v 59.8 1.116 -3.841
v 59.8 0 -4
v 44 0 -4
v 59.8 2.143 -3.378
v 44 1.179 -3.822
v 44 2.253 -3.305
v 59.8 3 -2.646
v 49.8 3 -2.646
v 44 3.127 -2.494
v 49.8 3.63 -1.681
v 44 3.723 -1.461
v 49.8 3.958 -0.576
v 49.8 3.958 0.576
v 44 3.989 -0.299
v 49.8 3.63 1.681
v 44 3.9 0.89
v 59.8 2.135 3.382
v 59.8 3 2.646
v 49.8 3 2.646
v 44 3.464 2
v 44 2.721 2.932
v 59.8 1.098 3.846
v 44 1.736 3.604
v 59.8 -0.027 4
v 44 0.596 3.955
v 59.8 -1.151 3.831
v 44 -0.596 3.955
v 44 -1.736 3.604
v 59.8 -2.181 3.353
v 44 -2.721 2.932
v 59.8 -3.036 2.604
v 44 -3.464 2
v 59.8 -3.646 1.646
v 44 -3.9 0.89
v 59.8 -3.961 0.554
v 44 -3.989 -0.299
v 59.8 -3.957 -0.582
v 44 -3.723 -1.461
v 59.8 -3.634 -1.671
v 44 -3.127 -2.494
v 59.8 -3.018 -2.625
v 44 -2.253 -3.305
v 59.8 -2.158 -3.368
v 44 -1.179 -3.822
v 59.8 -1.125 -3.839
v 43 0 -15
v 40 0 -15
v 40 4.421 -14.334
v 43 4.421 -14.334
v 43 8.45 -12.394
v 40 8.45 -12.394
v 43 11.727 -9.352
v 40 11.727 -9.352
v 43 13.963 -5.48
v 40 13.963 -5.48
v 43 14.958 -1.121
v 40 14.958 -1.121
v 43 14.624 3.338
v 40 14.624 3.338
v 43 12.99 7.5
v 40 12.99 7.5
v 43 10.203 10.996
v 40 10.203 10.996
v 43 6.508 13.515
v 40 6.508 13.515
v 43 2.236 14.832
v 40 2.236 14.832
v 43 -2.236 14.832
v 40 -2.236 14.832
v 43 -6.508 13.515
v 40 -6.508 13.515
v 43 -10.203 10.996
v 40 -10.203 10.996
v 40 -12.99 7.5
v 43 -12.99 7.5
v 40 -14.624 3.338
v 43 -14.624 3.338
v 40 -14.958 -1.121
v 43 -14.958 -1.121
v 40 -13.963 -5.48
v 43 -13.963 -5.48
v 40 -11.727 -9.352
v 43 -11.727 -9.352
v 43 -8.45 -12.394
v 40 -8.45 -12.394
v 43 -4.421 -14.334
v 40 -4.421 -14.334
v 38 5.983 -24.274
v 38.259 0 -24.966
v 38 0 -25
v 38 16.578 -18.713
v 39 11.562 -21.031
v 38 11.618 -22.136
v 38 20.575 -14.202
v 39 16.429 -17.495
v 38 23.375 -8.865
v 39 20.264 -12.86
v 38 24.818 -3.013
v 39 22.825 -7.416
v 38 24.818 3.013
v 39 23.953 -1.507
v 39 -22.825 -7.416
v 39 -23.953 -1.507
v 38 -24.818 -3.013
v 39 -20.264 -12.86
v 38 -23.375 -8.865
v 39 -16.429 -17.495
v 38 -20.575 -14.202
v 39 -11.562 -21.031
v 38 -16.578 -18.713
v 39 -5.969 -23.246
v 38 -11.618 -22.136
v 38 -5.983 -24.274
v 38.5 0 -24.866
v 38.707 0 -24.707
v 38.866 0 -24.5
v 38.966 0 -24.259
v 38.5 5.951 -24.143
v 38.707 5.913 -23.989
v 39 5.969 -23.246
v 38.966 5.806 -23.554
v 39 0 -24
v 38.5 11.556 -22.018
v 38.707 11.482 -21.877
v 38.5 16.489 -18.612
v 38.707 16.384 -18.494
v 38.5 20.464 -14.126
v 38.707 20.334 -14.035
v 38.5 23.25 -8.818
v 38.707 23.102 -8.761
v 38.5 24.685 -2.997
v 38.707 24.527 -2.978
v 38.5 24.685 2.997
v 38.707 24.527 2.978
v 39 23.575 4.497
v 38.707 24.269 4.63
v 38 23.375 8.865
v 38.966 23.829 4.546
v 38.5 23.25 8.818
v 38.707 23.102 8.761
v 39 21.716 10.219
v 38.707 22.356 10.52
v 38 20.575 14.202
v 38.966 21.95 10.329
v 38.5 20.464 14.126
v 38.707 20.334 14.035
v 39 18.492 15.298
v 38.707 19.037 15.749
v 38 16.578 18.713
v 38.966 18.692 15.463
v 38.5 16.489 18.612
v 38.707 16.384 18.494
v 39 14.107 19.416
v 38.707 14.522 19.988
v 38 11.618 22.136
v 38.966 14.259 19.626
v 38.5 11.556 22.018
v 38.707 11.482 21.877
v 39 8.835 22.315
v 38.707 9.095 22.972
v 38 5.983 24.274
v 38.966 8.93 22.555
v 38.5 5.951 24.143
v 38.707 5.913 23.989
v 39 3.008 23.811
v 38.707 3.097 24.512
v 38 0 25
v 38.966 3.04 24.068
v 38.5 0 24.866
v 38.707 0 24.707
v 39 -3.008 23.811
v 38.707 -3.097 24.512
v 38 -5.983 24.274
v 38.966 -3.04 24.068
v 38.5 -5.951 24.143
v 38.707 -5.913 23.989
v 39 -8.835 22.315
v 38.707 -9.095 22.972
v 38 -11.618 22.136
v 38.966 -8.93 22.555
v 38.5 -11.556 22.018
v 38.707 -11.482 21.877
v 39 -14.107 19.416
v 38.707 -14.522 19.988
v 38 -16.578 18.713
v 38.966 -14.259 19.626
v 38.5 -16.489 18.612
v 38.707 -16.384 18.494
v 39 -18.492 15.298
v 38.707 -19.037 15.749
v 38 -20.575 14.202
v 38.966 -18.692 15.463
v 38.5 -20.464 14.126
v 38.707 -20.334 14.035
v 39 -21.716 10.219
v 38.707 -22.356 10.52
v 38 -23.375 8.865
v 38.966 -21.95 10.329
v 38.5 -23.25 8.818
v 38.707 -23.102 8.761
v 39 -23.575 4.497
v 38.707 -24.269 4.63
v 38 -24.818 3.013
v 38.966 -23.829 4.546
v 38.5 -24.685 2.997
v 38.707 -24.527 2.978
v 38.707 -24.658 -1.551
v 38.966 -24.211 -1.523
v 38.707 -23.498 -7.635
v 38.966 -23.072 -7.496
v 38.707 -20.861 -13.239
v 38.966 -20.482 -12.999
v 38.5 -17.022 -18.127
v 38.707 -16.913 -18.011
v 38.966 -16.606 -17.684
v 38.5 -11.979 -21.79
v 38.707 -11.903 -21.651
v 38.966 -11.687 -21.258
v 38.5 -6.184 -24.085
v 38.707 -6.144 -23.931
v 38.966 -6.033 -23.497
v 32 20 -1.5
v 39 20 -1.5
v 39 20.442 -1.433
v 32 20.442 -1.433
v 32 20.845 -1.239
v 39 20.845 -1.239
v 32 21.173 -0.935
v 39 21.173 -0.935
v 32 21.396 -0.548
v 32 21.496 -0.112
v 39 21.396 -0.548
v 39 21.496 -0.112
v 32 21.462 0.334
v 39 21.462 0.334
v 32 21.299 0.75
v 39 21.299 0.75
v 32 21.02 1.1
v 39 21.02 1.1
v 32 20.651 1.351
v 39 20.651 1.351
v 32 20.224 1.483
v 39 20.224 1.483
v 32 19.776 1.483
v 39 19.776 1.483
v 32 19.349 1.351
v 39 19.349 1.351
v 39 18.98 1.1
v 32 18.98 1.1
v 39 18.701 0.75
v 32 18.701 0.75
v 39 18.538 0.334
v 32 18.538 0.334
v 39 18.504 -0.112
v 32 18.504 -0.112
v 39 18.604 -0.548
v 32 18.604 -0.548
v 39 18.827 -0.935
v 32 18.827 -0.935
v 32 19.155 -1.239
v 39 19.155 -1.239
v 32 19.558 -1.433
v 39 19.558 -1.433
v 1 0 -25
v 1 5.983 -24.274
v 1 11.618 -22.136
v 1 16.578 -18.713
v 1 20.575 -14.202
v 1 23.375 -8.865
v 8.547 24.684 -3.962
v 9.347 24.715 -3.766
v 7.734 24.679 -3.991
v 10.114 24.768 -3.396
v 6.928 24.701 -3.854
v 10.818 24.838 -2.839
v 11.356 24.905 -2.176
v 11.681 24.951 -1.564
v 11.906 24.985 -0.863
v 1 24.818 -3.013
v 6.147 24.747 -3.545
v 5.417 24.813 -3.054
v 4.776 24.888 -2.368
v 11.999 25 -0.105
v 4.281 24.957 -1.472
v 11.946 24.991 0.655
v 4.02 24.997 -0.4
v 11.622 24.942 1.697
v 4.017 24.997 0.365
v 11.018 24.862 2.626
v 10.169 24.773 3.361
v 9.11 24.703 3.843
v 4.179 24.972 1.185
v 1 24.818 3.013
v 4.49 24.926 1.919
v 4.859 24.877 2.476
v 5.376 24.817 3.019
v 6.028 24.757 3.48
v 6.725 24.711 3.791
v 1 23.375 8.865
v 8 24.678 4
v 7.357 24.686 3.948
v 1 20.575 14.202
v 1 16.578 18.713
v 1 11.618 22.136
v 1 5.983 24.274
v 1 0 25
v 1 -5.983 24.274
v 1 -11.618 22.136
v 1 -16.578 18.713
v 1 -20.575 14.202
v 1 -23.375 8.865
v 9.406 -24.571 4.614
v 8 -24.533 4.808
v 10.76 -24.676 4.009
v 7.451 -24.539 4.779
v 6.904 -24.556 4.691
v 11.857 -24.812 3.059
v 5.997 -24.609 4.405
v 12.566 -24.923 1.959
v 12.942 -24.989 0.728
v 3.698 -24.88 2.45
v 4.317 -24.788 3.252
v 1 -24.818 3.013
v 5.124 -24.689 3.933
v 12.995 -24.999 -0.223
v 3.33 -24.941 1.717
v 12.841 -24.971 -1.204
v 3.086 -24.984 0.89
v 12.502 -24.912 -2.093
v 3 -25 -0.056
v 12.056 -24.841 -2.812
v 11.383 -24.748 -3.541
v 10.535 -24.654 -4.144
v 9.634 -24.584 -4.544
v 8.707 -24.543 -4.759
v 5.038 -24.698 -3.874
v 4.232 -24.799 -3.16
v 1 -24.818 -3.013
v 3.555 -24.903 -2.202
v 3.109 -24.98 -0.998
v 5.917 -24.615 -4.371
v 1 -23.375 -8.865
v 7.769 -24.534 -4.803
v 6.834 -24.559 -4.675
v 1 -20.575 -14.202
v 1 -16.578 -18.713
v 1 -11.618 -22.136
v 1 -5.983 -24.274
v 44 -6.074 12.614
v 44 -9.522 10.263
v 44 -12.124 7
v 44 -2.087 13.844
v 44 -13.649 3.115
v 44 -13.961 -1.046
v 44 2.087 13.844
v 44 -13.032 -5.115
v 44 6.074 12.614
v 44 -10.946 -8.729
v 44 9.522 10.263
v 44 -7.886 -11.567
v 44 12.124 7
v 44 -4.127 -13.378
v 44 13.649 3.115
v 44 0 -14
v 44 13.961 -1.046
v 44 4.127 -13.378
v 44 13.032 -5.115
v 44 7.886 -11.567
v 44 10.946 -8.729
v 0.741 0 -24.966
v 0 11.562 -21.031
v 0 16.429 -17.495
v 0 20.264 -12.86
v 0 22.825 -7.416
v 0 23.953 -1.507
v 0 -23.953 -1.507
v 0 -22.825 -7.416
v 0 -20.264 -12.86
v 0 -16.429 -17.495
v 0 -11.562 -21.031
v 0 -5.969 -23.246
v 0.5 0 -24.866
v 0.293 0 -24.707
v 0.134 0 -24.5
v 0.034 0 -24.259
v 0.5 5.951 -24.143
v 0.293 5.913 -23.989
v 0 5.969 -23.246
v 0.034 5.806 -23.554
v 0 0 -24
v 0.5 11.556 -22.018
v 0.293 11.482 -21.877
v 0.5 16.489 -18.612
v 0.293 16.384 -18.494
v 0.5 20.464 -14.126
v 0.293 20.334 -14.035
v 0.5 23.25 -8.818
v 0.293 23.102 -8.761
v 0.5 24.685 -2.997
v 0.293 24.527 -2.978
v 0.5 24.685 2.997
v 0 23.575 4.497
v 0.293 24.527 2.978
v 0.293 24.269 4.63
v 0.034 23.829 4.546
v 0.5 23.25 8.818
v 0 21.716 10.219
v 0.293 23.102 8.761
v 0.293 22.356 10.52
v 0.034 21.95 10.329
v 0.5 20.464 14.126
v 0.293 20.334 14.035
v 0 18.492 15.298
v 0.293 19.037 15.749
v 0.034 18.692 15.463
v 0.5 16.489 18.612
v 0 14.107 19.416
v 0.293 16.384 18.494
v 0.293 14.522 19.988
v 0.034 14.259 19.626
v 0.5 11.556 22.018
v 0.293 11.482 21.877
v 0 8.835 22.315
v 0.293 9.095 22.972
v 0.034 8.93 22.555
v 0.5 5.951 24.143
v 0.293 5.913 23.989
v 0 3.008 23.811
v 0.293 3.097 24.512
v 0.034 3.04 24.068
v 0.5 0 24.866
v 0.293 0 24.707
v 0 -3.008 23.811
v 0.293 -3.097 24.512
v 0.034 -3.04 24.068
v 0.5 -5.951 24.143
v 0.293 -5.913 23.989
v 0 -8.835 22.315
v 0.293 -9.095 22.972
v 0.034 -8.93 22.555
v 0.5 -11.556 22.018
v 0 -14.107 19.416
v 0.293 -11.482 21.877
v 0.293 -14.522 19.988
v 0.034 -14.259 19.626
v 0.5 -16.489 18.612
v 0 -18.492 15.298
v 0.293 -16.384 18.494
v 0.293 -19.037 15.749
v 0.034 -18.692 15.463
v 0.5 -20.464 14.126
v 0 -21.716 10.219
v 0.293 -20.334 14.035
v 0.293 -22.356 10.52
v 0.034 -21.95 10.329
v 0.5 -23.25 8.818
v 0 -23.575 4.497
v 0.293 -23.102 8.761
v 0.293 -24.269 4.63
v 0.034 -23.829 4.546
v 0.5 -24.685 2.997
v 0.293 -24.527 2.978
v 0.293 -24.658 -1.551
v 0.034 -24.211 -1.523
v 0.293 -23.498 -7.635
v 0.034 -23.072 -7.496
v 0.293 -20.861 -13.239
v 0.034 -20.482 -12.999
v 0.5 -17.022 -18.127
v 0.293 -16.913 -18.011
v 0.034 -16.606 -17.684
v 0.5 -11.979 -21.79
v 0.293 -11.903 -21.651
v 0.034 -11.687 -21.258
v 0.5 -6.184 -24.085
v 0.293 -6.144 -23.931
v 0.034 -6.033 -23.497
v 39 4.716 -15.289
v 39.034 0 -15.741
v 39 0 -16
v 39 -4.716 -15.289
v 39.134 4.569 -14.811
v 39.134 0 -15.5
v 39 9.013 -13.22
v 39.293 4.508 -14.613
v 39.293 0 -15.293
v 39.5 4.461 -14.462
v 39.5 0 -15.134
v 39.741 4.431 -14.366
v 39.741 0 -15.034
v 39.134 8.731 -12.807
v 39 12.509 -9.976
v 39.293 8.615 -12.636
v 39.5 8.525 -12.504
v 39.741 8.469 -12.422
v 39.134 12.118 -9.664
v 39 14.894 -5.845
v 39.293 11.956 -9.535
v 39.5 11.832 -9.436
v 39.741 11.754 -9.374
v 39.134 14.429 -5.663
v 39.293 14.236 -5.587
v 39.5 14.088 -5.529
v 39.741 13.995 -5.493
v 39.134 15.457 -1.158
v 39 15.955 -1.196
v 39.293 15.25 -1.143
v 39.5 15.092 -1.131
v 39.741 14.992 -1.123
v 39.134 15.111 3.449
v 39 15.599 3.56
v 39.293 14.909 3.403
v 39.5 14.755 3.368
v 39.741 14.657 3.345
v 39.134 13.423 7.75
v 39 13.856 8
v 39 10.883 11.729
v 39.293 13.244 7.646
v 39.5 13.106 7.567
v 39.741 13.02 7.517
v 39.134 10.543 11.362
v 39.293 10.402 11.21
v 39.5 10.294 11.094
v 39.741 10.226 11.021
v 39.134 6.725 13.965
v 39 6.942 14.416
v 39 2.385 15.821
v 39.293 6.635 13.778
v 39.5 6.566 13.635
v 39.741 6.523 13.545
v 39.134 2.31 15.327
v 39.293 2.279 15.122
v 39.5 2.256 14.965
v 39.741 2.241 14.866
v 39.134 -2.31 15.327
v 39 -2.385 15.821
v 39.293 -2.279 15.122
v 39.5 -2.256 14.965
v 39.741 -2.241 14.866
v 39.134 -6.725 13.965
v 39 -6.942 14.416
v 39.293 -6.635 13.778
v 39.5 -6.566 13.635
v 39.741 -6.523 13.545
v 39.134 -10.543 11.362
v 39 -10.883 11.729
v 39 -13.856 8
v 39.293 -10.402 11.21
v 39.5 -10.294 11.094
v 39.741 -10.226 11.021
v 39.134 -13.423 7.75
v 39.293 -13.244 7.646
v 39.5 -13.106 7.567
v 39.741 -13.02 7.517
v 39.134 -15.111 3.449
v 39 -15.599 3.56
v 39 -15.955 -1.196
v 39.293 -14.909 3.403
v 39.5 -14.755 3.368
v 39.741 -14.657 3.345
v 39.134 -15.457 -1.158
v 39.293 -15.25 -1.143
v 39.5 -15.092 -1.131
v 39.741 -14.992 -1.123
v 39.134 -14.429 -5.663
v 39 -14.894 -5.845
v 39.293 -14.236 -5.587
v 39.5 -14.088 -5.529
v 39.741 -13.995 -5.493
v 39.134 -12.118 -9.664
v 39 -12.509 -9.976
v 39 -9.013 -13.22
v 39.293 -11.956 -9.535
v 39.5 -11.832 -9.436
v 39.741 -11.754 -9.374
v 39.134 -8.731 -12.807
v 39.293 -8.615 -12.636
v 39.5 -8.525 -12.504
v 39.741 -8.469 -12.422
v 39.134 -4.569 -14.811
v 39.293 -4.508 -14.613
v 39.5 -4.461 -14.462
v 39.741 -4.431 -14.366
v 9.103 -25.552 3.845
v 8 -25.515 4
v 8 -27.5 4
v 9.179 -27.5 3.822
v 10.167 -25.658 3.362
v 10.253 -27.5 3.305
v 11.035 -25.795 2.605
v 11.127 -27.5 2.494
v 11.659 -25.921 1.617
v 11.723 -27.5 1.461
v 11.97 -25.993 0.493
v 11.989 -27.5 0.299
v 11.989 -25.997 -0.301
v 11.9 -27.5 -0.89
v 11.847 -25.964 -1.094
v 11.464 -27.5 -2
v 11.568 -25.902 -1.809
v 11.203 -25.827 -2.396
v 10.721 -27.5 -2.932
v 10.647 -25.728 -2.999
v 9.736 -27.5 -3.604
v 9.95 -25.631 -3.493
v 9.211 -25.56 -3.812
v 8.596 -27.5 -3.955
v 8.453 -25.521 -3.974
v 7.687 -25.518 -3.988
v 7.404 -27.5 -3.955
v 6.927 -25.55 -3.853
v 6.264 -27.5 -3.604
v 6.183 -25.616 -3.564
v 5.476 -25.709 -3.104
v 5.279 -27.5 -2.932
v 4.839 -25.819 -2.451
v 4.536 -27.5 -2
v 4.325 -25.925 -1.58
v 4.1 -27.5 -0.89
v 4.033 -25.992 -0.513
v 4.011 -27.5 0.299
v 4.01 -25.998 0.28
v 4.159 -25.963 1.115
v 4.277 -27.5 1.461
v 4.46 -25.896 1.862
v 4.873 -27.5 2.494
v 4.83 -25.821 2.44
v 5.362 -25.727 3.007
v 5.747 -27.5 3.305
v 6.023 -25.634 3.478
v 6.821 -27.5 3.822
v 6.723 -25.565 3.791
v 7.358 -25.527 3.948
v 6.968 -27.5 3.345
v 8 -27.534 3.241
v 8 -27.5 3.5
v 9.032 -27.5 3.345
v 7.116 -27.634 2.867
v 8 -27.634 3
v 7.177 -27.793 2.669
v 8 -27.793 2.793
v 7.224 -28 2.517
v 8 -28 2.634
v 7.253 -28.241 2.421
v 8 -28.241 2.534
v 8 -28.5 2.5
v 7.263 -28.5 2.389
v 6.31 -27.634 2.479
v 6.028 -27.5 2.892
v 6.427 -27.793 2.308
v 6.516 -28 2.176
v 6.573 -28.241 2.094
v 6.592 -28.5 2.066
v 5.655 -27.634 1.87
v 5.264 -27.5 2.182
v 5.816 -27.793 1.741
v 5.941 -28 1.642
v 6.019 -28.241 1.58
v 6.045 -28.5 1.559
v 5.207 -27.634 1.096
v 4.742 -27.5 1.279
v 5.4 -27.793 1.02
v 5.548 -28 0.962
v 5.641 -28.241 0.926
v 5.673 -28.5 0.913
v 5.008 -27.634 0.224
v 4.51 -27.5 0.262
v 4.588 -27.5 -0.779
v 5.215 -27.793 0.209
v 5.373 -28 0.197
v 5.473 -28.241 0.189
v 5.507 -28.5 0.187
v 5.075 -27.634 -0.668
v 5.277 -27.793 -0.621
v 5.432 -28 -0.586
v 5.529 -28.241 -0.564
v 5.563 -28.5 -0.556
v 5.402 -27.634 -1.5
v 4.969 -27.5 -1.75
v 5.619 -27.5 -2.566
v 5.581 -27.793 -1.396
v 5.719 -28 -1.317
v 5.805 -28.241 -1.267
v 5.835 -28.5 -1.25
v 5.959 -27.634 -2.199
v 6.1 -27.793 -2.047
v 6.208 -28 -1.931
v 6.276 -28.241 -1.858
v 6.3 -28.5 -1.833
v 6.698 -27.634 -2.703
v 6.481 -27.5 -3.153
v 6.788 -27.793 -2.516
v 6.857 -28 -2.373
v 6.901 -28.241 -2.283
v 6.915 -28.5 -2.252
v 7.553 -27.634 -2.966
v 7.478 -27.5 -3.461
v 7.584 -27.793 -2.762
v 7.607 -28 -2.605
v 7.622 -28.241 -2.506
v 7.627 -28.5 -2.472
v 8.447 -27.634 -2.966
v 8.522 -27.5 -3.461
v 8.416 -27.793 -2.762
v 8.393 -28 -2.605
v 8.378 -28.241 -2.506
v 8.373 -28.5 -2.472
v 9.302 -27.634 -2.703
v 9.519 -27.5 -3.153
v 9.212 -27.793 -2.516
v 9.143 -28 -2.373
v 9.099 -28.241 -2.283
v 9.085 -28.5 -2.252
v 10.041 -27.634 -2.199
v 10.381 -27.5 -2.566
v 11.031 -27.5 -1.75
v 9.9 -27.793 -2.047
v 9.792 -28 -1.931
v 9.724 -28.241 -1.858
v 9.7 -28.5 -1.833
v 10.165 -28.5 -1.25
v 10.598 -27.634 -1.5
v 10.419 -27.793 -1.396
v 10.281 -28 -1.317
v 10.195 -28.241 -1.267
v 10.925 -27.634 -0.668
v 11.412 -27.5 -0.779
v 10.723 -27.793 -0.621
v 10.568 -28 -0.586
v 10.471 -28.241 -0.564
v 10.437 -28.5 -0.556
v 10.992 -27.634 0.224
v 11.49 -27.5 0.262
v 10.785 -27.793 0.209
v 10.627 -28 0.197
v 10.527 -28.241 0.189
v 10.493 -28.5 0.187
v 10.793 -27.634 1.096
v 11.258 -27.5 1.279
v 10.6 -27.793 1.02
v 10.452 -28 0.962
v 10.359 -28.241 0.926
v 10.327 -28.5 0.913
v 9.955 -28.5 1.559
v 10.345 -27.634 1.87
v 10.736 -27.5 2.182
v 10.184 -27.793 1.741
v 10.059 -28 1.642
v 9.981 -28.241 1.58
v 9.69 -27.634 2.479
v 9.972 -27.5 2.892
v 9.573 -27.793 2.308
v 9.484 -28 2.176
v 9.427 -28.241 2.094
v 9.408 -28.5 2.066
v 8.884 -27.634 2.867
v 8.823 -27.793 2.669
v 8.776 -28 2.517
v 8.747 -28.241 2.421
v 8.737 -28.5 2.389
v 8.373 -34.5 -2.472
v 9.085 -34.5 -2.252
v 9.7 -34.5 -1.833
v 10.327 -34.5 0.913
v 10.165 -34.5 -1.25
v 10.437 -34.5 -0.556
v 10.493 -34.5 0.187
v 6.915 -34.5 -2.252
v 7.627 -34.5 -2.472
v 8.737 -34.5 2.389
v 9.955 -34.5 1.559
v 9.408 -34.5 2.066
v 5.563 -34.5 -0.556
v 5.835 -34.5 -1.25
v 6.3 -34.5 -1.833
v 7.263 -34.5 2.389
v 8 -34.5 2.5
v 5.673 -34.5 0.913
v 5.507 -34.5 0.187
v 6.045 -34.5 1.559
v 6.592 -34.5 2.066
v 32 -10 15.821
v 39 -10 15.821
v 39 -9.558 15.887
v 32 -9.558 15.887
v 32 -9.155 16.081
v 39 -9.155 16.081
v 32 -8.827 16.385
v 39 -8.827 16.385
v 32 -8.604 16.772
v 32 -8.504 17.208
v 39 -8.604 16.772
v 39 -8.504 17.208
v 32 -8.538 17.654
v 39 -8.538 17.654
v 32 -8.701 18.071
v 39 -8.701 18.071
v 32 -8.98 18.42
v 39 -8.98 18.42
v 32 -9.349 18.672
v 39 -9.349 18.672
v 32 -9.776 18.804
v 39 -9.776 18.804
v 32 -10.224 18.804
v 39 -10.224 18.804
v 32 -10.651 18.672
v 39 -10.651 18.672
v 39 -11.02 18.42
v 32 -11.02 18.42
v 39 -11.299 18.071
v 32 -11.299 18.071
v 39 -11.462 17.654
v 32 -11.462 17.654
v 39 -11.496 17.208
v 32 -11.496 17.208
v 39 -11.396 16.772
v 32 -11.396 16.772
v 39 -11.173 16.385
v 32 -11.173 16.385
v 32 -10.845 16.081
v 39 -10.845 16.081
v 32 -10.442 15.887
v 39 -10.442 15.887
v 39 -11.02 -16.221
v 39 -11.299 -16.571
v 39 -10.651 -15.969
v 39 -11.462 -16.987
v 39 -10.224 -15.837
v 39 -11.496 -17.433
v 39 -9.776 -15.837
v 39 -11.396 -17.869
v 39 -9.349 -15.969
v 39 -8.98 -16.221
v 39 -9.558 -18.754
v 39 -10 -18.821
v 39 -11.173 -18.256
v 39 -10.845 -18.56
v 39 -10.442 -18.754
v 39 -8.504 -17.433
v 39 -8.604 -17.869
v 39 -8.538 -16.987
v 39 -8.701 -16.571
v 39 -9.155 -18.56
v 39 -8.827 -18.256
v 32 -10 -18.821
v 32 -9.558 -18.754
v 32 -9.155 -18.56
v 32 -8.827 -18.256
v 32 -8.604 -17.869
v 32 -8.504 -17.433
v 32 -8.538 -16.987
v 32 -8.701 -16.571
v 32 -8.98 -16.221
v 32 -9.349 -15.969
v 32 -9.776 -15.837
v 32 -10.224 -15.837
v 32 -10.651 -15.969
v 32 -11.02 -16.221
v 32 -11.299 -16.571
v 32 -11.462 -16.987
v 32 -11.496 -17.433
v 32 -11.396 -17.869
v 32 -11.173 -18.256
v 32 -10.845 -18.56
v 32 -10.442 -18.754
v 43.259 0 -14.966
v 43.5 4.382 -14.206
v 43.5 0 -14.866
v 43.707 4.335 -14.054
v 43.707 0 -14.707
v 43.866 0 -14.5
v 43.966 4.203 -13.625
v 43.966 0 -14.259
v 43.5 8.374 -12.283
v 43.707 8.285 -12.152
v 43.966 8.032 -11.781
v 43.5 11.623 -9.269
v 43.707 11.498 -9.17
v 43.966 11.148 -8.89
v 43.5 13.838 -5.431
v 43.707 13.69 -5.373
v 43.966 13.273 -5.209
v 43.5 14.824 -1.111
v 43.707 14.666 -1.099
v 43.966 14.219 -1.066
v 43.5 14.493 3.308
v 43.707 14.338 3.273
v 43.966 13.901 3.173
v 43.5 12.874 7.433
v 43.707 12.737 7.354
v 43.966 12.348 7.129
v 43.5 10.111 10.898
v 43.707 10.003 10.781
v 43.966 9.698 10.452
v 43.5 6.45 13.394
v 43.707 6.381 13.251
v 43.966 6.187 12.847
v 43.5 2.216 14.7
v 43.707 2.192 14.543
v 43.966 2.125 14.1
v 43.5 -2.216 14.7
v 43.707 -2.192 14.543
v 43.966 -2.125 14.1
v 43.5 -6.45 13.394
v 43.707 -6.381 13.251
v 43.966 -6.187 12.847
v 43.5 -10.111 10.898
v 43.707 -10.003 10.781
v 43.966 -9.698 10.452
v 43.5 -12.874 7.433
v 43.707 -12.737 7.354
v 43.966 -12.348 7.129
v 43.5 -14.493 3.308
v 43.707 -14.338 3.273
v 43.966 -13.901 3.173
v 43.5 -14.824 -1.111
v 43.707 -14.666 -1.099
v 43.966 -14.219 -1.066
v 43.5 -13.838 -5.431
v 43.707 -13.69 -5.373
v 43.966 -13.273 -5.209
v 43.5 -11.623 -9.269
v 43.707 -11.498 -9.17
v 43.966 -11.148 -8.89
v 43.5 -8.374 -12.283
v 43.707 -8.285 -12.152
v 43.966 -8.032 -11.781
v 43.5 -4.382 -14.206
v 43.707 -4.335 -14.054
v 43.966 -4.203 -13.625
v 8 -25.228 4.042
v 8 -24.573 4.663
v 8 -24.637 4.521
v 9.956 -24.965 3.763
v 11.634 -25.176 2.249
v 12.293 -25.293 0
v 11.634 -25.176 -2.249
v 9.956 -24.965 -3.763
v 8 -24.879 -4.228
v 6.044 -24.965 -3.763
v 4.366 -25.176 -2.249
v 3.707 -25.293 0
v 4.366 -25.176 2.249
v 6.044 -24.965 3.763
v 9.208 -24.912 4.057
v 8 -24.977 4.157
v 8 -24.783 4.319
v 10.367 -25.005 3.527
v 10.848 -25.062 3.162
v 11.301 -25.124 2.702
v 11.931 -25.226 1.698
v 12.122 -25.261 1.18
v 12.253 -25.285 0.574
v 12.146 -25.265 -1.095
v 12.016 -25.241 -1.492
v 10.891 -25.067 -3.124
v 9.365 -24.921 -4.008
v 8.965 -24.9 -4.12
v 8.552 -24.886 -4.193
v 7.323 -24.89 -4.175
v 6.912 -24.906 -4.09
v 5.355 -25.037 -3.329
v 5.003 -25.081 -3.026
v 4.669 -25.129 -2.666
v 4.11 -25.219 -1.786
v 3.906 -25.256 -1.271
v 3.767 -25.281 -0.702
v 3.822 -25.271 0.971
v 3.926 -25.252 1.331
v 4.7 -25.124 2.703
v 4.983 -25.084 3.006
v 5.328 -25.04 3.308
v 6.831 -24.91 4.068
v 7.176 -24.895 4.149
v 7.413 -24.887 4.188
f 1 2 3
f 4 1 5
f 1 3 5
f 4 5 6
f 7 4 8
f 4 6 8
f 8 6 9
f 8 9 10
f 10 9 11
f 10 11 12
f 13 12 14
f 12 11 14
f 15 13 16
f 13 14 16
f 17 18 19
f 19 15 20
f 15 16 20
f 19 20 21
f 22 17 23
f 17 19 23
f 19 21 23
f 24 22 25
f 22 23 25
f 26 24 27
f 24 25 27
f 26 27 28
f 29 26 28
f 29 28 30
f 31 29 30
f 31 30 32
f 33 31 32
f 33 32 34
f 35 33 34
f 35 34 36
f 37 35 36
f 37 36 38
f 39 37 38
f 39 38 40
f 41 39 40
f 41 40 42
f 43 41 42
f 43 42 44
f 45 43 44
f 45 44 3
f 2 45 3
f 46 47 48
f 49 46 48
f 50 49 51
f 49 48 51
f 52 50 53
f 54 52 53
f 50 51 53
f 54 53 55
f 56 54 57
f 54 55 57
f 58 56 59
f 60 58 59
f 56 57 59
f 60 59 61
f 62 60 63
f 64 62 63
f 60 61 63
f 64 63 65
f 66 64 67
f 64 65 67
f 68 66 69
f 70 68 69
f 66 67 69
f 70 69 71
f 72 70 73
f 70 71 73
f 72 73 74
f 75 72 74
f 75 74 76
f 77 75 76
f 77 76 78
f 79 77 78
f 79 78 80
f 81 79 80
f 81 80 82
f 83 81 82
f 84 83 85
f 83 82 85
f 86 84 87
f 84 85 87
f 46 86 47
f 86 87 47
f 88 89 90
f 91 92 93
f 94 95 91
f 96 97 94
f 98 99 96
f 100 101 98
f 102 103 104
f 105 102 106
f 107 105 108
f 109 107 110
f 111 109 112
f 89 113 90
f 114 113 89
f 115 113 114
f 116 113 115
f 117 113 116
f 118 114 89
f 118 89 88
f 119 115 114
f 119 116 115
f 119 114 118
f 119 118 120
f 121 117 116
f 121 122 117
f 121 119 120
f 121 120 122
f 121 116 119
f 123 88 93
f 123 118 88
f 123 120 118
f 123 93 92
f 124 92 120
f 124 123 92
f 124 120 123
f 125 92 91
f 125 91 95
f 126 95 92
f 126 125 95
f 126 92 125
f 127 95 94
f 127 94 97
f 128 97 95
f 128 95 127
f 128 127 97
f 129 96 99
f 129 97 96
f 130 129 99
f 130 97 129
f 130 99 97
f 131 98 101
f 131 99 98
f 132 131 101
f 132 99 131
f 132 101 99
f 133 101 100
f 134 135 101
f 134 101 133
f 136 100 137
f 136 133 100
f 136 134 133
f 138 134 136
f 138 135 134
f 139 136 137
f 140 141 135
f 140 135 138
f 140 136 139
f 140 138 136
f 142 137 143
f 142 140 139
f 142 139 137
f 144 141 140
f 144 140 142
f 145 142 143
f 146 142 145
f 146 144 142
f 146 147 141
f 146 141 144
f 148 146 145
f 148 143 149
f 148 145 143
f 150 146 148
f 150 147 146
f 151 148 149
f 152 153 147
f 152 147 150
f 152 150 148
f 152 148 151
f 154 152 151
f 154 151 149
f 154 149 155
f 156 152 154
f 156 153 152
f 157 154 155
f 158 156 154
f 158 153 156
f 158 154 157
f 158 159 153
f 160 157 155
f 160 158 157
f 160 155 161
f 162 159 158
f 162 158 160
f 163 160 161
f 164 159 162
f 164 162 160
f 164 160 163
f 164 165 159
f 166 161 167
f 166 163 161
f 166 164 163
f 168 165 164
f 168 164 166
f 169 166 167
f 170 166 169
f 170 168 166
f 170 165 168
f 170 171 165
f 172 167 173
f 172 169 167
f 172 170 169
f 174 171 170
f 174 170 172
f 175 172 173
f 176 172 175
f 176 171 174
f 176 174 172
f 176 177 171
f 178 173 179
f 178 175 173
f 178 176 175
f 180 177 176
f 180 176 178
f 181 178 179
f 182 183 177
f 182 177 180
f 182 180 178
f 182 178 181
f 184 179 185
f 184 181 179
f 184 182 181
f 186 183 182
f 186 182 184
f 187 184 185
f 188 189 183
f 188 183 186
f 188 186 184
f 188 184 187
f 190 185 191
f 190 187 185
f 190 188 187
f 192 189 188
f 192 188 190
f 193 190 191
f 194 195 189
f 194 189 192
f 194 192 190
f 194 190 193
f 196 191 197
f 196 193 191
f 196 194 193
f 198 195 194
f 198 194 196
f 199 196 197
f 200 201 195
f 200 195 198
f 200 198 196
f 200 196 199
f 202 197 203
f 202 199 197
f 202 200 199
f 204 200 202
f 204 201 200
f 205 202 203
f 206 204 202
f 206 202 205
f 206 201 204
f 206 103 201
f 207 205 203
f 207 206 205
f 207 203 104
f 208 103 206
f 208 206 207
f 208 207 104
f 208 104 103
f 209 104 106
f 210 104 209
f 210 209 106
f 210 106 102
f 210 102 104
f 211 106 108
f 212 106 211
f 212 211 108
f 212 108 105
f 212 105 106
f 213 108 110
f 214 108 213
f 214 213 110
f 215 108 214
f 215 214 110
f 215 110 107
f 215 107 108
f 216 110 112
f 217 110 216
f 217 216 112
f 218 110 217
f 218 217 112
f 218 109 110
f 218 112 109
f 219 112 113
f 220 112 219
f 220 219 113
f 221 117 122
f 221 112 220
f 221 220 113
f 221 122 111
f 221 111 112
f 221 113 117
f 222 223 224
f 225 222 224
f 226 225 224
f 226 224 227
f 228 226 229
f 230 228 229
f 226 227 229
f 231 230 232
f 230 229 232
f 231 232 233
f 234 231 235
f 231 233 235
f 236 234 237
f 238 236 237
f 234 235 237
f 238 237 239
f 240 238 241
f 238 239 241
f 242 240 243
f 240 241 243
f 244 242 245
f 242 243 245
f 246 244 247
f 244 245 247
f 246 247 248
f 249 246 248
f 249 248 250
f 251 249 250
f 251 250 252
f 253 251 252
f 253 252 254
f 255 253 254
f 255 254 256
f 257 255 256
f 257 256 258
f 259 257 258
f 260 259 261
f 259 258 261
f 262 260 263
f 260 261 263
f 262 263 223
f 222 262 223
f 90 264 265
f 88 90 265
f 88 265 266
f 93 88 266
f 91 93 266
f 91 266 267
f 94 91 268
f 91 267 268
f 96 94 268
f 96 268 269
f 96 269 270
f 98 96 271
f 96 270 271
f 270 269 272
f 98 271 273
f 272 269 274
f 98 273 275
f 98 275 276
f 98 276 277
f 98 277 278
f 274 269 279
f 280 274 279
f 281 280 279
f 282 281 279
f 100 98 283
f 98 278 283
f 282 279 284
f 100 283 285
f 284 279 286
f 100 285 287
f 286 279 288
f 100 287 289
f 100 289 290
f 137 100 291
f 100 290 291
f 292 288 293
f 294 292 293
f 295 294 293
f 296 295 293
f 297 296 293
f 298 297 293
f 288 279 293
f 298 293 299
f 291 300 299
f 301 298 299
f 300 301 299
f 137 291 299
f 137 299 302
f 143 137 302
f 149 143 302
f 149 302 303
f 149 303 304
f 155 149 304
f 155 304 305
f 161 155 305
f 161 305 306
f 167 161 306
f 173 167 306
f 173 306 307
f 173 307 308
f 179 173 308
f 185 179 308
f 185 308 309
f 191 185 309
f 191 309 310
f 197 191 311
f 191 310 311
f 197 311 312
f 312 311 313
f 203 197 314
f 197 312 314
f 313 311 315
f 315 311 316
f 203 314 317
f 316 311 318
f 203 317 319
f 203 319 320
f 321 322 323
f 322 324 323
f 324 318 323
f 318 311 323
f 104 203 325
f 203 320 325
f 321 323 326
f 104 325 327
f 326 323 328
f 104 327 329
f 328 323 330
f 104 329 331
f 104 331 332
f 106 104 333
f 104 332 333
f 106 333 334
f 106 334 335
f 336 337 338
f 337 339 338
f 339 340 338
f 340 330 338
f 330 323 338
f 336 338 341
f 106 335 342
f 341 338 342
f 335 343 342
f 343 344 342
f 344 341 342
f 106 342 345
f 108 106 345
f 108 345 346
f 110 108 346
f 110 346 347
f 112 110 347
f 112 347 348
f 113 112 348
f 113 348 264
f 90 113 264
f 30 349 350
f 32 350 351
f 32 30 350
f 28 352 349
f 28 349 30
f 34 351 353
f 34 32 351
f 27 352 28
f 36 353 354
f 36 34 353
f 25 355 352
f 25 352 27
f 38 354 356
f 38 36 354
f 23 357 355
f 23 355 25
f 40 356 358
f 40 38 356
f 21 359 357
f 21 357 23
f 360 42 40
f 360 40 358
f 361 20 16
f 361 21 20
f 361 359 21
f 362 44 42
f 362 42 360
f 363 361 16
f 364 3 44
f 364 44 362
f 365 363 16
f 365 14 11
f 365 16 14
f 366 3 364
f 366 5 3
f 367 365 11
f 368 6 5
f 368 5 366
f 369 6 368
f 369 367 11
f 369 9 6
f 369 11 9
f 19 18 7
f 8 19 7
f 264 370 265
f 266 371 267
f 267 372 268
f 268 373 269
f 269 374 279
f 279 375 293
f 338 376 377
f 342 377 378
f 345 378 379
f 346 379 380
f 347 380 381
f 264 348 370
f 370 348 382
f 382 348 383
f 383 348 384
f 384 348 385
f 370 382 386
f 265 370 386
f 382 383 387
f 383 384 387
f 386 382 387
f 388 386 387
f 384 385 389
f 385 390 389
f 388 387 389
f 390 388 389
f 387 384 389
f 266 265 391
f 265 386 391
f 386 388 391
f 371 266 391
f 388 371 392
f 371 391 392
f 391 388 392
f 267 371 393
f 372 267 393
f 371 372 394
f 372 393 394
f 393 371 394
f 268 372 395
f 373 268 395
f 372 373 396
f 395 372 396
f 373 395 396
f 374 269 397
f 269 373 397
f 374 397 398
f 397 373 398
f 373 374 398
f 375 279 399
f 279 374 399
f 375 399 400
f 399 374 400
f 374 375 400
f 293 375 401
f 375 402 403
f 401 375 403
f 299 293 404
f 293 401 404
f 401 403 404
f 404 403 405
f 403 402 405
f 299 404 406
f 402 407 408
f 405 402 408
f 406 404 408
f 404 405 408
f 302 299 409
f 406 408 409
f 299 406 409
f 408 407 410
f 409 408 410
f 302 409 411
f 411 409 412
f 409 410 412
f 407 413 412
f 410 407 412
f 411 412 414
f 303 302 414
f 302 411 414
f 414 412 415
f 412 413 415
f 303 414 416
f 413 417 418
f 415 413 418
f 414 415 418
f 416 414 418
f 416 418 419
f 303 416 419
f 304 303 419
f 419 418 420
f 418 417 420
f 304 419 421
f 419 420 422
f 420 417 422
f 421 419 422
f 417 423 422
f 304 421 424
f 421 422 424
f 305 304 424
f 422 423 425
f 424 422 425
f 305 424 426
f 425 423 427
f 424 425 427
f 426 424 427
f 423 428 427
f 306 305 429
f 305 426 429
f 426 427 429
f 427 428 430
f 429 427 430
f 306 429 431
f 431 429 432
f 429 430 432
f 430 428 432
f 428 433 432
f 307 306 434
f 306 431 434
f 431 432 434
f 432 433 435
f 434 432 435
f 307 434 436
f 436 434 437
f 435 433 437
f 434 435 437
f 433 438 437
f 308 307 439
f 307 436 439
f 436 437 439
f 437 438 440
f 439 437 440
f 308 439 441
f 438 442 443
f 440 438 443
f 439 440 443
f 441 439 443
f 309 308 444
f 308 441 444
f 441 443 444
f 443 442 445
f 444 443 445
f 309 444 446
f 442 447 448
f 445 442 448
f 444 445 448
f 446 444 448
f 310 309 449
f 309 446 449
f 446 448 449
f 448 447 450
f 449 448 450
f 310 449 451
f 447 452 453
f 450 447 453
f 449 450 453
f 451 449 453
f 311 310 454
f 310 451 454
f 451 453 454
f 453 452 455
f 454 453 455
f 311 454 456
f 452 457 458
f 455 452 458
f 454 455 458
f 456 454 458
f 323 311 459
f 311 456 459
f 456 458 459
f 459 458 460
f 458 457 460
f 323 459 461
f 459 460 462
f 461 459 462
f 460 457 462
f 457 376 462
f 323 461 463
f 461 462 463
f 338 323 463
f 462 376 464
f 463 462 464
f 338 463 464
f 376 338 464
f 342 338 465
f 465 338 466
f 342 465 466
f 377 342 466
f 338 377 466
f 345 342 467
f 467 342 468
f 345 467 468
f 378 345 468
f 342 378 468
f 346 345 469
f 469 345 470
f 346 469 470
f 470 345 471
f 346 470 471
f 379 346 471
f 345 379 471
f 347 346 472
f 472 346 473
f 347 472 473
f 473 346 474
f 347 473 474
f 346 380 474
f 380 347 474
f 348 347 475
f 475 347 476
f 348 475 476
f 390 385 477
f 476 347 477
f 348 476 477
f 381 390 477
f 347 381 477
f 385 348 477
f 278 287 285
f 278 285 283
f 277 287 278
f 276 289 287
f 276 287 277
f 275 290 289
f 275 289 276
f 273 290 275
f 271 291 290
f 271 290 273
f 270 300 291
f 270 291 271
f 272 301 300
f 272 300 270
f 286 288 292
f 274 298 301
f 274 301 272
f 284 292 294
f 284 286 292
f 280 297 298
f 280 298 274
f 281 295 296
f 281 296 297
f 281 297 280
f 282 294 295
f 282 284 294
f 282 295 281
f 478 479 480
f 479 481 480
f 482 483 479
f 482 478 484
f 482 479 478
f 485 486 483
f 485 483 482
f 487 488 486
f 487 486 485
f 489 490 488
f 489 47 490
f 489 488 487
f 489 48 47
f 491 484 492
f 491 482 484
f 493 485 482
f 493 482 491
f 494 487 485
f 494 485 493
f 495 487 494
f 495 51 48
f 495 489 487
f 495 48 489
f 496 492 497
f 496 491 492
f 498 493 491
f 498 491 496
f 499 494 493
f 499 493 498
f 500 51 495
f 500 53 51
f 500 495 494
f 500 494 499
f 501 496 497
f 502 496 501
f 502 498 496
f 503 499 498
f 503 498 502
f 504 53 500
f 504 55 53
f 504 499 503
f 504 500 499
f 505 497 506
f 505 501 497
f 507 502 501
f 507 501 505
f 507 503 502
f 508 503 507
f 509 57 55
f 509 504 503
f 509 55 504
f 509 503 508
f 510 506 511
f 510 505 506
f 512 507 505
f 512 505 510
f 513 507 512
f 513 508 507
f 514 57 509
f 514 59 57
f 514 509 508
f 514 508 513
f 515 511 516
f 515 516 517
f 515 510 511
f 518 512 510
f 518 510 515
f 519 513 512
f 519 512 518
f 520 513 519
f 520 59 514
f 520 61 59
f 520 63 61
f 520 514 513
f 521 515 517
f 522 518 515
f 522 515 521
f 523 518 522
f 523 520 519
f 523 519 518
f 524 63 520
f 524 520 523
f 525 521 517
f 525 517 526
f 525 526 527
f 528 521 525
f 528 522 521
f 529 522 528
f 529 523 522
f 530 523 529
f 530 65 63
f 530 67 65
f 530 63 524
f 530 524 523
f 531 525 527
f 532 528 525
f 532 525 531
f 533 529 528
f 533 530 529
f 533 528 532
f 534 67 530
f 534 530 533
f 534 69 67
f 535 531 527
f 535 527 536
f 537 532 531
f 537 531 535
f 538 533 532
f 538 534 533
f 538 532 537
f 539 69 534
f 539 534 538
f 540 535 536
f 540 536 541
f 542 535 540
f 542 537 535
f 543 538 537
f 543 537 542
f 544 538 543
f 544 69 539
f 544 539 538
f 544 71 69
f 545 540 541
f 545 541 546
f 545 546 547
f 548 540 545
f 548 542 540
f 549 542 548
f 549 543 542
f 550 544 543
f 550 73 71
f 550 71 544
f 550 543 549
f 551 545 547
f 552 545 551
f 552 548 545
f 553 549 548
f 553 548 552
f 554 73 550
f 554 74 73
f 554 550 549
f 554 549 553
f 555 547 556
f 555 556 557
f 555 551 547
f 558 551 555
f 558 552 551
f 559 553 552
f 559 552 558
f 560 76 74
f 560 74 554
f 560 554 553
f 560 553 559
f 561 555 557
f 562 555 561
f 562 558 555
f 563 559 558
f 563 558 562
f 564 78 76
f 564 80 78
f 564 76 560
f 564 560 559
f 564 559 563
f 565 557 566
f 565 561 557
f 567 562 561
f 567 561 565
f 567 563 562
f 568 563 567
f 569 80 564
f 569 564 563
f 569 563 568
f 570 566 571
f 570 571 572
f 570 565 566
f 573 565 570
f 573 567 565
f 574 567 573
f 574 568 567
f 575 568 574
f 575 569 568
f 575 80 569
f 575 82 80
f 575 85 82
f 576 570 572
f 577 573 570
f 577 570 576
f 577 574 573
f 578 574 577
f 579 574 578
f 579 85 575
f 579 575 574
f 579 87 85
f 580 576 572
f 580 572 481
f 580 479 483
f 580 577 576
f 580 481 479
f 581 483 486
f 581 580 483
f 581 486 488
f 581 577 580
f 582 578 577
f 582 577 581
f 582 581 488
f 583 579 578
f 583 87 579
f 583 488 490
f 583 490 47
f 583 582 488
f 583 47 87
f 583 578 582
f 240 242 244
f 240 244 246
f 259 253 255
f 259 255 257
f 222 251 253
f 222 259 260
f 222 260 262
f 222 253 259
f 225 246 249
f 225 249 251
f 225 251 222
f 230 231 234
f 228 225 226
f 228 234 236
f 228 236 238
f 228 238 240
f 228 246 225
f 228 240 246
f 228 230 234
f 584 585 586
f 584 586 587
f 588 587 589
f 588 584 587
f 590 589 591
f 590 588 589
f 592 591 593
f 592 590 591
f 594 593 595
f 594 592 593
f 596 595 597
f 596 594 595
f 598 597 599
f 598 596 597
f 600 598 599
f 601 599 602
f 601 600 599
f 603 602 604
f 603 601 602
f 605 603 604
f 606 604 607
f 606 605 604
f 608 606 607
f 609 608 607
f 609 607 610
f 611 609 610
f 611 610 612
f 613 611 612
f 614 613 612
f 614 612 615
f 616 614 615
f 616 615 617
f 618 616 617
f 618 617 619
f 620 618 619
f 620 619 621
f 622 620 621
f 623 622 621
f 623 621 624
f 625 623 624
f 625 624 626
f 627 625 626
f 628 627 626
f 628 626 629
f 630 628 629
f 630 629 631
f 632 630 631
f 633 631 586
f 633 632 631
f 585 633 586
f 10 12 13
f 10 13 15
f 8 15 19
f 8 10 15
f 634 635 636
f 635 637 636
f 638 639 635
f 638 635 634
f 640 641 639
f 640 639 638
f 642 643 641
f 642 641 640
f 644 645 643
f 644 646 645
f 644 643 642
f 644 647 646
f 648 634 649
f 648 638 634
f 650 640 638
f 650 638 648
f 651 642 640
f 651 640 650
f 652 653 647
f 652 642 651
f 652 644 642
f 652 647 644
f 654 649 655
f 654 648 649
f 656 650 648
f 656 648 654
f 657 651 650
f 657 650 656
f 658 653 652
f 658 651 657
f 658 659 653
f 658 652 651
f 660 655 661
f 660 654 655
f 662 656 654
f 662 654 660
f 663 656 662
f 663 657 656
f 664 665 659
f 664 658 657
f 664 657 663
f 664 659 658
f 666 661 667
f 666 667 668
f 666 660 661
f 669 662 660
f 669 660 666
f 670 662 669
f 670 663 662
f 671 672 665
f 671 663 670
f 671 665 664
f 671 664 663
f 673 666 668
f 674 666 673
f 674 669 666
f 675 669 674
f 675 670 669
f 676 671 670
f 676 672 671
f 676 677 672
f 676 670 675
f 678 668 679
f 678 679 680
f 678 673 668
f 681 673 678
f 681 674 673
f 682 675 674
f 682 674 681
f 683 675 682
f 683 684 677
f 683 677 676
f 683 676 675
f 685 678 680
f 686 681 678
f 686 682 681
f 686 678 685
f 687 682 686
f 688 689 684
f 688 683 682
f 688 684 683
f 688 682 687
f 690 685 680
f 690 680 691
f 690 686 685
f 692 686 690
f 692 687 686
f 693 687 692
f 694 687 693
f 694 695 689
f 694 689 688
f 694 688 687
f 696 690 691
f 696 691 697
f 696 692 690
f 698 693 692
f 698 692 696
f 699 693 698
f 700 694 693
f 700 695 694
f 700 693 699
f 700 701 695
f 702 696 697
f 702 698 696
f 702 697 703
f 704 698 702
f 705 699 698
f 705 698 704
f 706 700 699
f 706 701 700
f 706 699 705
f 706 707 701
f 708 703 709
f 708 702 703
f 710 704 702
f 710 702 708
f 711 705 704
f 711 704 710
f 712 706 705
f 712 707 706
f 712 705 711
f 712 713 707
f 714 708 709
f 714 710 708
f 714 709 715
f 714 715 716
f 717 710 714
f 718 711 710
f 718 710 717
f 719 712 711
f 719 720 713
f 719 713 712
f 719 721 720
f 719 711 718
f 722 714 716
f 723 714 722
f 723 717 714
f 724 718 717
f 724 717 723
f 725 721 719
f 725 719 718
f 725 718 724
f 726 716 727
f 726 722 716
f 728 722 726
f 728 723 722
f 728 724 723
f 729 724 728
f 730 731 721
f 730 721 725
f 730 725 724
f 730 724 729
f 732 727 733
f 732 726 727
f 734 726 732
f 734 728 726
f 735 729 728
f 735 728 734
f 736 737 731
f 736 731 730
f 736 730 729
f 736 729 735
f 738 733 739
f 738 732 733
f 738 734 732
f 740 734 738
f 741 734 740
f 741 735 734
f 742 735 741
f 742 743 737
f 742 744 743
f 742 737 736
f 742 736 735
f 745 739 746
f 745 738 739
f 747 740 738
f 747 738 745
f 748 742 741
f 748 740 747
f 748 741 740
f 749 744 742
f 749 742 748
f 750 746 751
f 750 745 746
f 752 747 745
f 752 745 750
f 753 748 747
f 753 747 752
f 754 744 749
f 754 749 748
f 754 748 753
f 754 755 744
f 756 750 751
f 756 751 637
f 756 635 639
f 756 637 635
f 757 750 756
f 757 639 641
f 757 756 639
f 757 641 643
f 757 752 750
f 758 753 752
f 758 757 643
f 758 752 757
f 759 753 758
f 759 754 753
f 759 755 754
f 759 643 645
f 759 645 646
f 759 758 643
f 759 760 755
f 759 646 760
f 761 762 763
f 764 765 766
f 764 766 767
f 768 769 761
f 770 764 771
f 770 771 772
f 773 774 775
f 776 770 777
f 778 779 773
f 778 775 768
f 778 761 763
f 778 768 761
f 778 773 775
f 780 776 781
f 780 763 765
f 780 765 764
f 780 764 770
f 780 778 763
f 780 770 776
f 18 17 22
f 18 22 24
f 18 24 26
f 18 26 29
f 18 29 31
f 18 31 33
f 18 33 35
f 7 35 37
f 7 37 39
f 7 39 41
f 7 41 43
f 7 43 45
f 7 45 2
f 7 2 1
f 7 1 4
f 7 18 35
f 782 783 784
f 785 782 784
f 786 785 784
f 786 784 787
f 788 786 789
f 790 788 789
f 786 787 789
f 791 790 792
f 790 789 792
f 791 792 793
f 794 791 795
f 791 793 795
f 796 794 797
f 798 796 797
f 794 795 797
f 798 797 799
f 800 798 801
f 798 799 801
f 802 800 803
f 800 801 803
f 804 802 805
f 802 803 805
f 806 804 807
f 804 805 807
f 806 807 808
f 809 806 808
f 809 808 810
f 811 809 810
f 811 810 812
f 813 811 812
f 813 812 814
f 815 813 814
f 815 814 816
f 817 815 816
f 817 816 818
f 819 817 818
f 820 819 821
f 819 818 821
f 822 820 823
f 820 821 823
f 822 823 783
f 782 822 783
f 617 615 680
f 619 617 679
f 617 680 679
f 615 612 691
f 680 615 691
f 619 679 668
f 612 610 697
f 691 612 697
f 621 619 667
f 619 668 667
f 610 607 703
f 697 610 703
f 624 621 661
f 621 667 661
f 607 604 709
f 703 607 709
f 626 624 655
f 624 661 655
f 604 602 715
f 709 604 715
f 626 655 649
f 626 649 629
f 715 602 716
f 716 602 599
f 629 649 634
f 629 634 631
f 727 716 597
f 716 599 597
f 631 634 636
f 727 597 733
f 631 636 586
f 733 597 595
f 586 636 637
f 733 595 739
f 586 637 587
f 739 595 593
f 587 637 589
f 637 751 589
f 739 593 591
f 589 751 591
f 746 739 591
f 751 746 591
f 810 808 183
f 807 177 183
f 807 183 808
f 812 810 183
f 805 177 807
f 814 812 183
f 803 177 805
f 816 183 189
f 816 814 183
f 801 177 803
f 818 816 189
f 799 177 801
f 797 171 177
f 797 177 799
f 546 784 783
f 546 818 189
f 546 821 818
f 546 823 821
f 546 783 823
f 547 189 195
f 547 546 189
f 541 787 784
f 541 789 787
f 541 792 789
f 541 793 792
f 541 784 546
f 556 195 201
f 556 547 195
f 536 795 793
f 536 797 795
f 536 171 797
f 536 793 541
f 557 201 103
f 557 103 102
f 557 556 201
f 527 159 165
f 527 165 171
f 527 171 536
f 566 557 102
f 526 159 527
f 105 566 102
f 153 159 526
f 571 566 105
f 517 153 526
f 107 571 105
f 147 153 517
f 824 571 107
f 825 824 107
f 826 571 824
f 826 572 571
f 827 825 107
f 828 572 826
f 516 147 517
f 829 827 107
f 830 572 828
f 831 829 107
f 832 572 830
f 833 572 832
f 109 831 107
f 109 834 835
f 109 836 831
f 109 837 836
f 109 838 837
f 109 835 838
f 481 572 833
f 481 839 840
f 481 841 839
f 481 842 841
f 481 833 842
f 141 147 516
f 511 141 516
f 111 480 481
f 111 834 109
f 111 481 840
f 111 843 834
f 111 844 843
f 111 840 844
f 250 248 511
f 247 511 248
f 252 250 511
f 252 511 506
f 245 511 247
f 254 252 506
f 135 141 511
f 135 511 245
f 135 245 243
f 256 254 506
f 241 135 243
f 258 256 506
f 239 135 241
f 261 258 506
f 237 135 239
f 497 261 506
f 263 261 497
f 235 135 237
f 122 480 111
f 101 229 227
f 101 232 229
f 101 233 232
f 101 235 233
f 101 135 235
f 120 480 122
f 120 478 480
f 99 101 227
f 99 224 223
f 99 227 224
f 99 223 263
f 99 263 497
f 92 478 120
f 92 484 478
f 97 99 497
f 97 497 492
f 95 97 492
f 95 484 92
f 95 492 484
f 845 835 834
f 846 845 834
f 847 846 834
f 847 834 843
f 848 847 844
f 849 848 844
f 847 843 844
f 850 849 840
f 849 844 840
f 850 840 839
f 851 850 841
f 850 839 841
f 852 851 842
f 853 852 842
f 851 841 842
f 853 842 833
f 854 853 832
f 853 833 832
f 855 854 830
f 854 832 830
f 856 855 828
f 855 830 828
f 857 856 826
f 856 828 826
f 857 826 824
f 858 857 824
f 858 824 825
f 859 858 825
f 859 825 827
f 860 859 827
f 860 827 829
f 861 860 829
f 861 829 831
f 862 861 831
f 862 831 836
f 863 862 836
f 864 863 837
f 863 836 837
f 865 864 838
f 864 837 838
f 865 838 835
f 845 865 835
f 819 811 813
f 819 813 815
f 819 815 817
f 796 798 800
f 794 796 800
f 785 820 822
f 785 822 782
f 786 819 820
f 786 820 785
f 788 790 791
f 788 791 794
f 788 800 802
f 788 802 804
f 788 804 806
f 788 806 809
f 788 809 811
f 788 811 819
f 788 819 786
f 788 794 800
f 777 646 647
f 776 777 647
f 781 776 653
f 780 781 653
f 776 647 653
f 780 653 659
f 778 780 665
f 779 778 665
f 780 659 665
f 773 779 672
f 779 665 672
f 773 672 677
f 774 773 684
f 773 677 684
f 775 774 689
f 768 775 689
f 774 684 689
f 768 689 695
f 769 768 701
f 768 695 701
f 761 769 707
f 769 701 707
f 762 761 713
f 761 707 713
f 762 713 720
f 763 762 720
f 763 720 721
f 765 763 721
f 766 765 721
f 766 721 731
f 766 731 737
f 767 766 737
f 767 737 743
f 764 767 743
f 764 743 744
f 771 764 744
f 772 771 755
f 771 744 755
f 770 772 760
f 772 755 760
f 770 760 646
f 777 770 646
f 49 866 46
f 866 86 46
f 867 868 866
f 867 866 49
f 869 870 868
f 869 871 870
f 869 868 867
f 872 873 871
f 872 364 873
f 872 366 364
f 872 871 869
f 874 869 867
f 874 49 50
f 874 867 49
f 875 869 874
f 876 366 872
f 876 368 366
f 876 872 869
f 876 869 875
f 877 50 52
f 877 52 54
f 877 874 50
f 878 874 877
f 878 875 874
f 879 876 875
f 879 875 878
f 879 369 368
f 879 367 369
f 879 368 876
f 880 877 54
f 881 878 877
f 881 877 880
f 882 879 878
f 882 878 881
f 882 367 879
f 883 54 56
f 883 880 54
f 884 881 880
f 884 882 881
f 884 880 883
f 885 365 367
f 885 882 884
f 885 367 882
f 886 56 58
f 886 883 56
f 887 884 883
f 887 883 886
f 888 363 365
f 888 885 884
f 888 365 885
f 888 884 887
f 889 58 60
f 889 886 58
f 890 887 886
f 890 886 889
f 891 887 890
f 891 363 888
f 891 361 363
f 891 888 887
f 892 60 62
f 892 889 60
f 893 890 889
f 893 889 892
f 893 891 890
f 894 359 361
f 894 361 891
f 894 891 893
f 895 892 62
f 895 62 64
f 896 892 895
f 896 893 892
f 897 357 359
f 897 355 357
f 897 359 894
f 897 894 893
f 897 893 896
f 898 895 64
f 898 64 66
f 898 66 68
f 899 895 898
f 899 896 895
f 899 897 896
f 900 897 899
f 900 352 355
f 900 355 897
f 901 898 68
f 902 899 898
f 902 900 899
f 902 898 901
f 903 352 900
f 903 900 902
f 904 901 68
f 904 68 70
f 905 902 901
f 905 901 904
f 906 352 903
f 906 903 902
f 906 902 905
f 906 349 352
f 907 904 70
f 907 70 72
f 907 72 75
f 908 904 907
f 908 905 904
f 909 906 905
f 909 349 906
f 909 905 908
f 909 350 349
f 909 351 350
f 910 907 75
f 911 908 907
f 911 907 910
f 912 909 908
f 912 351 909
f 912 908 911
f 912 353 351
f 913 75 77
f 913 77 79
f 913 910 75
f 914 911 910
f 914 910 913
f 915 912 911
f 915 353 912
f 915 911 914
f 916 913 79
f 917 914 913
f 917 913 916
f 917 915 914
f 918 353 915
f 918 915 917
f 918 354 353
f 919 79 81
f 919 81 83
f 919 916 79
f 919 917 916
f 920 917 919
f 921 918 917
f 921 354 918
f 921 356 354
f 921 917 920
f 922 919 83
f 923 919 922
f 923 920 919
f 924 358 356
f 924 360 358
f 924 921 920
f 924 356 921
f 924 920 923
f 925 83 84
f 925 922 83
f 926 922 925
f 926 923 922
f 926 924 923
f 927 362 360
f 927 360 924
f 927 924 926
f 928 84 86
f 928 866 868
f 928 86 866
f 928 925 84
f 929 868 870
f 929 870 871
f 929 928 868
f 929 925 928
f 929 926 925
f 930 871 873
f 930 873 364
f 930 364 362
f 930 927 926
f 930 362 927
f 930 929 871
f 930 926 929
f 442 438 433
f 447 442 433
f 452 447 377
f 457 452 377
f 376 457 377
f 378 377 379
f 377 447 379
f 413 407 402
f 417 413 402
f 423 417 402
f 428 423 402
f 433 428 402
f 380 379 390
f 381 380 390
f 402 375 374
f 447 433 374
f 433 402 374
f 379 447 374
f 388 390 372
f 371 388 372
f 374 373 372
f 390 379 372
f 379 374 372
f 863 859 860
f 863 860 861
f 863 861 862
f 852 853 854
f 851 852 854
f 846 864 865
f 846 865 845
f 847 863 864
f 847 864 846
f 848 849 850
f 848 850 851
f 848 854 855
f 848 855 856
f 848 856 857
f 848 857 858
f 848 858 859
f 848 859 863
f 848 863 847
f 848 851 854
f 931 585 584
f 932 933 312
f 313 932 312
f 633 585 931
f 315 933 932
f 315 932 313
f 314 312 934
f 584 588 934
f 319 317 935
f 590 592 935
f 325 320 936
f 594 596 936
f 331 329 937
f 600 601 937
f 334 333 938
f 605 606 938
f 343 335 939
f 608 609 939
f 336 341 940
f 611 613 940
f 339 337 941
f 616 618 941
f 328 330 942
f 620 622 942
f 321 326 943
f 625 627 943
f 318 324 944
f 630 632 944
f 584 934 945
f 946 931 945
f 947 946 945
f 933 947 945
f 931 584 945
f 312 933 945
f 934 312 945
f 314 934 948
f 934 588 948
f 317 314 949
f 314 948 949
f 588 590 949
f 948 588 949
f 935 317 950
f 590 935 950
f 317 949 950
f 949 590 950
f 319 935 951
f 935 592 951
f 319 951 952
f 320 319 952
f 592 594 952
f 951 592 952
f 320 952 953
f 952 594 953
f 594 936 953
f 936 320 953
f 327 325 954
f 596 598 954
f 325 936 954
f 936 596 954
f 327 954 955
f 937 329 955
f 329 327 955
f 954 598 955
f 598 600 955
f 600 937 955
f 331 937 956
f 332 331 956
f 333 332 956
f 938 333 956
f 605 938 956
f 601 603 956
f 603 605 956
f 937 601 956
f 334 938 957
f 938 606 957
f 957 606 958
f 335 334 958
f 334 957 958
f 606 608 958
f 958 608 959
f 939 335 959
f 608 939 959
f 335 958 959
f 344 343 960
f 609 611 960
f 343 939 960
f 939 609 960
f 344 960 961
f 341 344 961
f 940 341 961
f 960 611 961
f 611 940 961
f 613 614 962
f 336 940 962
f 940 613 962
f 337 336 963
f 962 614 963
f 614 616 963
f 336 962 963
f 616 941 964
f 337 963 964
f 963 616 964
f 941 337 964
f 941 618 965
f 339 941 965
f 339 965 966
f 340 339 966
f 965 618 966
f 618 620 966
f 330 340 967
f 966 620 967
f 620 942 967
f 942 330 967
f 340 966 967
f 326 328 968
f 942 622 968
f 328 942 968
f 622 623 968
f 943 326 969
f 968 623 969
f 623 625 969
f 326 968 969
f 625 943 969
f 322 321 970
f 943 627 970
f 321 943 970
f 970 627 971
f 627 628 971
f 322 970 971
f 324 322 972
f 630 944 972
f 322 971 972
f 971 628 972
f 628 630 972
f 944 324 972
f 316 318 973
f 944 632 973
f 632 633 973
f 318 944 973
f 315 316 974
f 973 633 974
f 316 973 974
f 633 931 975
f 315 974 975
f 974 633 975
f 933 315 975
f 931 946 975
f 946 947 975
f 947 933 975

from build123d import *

# Parameters (mm, degrees)
SKETCH2_R                       = 25
BOSS_EXTRUDE1_DEPTH             = 39
SKETCH3_R                       = 15
BOSS_EXTRUDE2_DEPTH             = 5
SKETCH4_R                       = 4
BOSS_EXTRUDE3_DEPTH             = 15.8
CUT_EXTRUDE1_START              = -10
CUT_EXTRUDE1_DEPTH              = 10
SKETCH6_R                       = 1.5
CUT_EXTRUDE2_DEPTH              = 7
BOSS_EXTRUDE4_REACH             = 80.905
BOSS_EXTRUDE4_END_RADIUS        = 25
SKETCH8_R                       = 4
BOSS_EXTRUDE4_DIRECTION_2_DEPTH = 7.5
SKETCH9_R                       = 2.5
BOSS_EXTRUDE5_DEPTH             = 7
FILLET1_R                       = 1


with BuildPart() as part:
    # Sketch2 → Boss-Extrude1 (new body)
    with BuildSketch(Plane(origin=(0, 0, 0), x_dir=(0, 0, -1), z_dir=(1, 0, 0))):
        Circle(SKETCH2_R)
    extrude(amount=BOSS_EXTRUDE1_DEPTH)

    # Sketch3 → Boss-Extrude2 (add)
    with BuildSketch(Plane(origin=(39, 0, 0), x_dir=(0, 0, -1), z_dir=(1, 0, 0))):
        Circle(SKETCH3_R)
    extrude(amount=BOSS_EXTRUDE2_DEPTH)

    # Sketch4 → Boss-Extrude3 (add)
    with BuildSketch(Plane(origin=(44, 0, 0), x_dir=(0, 0, -1), z_dir=(1, 0, 0))):
        Circle(SKETCH4_R)
    extrude(amount=BOSS_EXTRUDE3_DEPTH)

    # Sketch5 → Cut-Extrude1 (cut)
    with BuildSketch(Plane(origin=(59.8, 0, 0), x_dir=(0, 0, -1), z_dir=(1, 0, 0)).offset(CUT_EXTRUDE1_START)):
        with BuildLine():
            Line((-2.645751311, 3), (2.645751311, 3))
            ThreePointArc((2.645751311, 3), (0, 4), (-2.645751311, 3))
        make_face()
    extrude(amount=CUT_EXTRUDE1_DEPTH, mode=Mode.SUBTRACT)

    # Sketch6 → Cut-Extrude2 (cut)
    with BuildSketch(Plane(origin=(39, 0, 0), x_dir=(0, 0, -1), z_dir=(1, 0, 0))):
        with Locations((0, 20)):
            Circle(SKETCH6_R)
        with Locations((17.320508076, -10)):
            Circle(SKETCH6_R)
        with Locations((-17.320508076, -10)):
            Circle(SKETCH6_R)
    extrude(amount=-CUT_EXTRUDE2_DEPTH, mode=Mode.SUBTRACT)

    # Boss-Extrude4: up to this cylinder (the profile starts inside it)
    boss_extrude4_end = Plane(origin=(8, 0, 0), z_dir=(-1, 0, 0)) * Cylinder(BOSS_EXTRUDE4_END_RADIUS, 212.81, mode=Mode.PRIVATE)
    # Sketch8 → Boss-Extrude4 (add, up to the surface)
    with BuildSketch(Plane(origin=(0, -20, 0), x_dir=(1, 0, 0), z_dir=(0, 1, 0)), mode=Mode.PRIVATE) as boss_extrude4_sk1:
        with Locations((8, 0)):
            Circle(SKETCH8_R)
    boss_extrude4_tool1 = extrude(boss_extrude4_sk1.sketch, amount=BOSS_EXTRUDE4_REACH, mode=Mode.PRIVATE) & boss_extrude4_end
    add(boss_extrude4_tool1.solids().sort_by_distance((8, -20, 0))[0])

    # Sketch8 → Boss-Extrude4 direction 2 (add)
    with BuildSketch(Plane(origin=(0, -20, 0), x_dir=(1, 0, 0), z_dir=(0, 1, 0))):
        with Locations((8, 0)):
            Circle(SKETCH8_R)
    extrude(amount=-BOSS_EXTRUDE4_DIRECTION_2_DEPTH)

    # Sketch9 → Boss-Extrude5 (add)
    with BuildSketch(Plane.XZ.offset(27.5)):
        with Locations((8, 0)):
            Circle(SKETCH9_R)
    extrude(amount=BOSS_EXTRUDE5_DEPTH)

    # Fillet1
    fillet1_edges = [part.edges().sort_by_distance(p)[0] for p in [
        (0, 0, 25),
        (39, 0, 25),
        (4, -25, 0),
        (5.5, -27.5, 0),
        (39, 0, 15),
        (44, 0, 15),
    ]]
    fillet(fillet1_edges, radius=FILLET1_R)


solid = part.part
